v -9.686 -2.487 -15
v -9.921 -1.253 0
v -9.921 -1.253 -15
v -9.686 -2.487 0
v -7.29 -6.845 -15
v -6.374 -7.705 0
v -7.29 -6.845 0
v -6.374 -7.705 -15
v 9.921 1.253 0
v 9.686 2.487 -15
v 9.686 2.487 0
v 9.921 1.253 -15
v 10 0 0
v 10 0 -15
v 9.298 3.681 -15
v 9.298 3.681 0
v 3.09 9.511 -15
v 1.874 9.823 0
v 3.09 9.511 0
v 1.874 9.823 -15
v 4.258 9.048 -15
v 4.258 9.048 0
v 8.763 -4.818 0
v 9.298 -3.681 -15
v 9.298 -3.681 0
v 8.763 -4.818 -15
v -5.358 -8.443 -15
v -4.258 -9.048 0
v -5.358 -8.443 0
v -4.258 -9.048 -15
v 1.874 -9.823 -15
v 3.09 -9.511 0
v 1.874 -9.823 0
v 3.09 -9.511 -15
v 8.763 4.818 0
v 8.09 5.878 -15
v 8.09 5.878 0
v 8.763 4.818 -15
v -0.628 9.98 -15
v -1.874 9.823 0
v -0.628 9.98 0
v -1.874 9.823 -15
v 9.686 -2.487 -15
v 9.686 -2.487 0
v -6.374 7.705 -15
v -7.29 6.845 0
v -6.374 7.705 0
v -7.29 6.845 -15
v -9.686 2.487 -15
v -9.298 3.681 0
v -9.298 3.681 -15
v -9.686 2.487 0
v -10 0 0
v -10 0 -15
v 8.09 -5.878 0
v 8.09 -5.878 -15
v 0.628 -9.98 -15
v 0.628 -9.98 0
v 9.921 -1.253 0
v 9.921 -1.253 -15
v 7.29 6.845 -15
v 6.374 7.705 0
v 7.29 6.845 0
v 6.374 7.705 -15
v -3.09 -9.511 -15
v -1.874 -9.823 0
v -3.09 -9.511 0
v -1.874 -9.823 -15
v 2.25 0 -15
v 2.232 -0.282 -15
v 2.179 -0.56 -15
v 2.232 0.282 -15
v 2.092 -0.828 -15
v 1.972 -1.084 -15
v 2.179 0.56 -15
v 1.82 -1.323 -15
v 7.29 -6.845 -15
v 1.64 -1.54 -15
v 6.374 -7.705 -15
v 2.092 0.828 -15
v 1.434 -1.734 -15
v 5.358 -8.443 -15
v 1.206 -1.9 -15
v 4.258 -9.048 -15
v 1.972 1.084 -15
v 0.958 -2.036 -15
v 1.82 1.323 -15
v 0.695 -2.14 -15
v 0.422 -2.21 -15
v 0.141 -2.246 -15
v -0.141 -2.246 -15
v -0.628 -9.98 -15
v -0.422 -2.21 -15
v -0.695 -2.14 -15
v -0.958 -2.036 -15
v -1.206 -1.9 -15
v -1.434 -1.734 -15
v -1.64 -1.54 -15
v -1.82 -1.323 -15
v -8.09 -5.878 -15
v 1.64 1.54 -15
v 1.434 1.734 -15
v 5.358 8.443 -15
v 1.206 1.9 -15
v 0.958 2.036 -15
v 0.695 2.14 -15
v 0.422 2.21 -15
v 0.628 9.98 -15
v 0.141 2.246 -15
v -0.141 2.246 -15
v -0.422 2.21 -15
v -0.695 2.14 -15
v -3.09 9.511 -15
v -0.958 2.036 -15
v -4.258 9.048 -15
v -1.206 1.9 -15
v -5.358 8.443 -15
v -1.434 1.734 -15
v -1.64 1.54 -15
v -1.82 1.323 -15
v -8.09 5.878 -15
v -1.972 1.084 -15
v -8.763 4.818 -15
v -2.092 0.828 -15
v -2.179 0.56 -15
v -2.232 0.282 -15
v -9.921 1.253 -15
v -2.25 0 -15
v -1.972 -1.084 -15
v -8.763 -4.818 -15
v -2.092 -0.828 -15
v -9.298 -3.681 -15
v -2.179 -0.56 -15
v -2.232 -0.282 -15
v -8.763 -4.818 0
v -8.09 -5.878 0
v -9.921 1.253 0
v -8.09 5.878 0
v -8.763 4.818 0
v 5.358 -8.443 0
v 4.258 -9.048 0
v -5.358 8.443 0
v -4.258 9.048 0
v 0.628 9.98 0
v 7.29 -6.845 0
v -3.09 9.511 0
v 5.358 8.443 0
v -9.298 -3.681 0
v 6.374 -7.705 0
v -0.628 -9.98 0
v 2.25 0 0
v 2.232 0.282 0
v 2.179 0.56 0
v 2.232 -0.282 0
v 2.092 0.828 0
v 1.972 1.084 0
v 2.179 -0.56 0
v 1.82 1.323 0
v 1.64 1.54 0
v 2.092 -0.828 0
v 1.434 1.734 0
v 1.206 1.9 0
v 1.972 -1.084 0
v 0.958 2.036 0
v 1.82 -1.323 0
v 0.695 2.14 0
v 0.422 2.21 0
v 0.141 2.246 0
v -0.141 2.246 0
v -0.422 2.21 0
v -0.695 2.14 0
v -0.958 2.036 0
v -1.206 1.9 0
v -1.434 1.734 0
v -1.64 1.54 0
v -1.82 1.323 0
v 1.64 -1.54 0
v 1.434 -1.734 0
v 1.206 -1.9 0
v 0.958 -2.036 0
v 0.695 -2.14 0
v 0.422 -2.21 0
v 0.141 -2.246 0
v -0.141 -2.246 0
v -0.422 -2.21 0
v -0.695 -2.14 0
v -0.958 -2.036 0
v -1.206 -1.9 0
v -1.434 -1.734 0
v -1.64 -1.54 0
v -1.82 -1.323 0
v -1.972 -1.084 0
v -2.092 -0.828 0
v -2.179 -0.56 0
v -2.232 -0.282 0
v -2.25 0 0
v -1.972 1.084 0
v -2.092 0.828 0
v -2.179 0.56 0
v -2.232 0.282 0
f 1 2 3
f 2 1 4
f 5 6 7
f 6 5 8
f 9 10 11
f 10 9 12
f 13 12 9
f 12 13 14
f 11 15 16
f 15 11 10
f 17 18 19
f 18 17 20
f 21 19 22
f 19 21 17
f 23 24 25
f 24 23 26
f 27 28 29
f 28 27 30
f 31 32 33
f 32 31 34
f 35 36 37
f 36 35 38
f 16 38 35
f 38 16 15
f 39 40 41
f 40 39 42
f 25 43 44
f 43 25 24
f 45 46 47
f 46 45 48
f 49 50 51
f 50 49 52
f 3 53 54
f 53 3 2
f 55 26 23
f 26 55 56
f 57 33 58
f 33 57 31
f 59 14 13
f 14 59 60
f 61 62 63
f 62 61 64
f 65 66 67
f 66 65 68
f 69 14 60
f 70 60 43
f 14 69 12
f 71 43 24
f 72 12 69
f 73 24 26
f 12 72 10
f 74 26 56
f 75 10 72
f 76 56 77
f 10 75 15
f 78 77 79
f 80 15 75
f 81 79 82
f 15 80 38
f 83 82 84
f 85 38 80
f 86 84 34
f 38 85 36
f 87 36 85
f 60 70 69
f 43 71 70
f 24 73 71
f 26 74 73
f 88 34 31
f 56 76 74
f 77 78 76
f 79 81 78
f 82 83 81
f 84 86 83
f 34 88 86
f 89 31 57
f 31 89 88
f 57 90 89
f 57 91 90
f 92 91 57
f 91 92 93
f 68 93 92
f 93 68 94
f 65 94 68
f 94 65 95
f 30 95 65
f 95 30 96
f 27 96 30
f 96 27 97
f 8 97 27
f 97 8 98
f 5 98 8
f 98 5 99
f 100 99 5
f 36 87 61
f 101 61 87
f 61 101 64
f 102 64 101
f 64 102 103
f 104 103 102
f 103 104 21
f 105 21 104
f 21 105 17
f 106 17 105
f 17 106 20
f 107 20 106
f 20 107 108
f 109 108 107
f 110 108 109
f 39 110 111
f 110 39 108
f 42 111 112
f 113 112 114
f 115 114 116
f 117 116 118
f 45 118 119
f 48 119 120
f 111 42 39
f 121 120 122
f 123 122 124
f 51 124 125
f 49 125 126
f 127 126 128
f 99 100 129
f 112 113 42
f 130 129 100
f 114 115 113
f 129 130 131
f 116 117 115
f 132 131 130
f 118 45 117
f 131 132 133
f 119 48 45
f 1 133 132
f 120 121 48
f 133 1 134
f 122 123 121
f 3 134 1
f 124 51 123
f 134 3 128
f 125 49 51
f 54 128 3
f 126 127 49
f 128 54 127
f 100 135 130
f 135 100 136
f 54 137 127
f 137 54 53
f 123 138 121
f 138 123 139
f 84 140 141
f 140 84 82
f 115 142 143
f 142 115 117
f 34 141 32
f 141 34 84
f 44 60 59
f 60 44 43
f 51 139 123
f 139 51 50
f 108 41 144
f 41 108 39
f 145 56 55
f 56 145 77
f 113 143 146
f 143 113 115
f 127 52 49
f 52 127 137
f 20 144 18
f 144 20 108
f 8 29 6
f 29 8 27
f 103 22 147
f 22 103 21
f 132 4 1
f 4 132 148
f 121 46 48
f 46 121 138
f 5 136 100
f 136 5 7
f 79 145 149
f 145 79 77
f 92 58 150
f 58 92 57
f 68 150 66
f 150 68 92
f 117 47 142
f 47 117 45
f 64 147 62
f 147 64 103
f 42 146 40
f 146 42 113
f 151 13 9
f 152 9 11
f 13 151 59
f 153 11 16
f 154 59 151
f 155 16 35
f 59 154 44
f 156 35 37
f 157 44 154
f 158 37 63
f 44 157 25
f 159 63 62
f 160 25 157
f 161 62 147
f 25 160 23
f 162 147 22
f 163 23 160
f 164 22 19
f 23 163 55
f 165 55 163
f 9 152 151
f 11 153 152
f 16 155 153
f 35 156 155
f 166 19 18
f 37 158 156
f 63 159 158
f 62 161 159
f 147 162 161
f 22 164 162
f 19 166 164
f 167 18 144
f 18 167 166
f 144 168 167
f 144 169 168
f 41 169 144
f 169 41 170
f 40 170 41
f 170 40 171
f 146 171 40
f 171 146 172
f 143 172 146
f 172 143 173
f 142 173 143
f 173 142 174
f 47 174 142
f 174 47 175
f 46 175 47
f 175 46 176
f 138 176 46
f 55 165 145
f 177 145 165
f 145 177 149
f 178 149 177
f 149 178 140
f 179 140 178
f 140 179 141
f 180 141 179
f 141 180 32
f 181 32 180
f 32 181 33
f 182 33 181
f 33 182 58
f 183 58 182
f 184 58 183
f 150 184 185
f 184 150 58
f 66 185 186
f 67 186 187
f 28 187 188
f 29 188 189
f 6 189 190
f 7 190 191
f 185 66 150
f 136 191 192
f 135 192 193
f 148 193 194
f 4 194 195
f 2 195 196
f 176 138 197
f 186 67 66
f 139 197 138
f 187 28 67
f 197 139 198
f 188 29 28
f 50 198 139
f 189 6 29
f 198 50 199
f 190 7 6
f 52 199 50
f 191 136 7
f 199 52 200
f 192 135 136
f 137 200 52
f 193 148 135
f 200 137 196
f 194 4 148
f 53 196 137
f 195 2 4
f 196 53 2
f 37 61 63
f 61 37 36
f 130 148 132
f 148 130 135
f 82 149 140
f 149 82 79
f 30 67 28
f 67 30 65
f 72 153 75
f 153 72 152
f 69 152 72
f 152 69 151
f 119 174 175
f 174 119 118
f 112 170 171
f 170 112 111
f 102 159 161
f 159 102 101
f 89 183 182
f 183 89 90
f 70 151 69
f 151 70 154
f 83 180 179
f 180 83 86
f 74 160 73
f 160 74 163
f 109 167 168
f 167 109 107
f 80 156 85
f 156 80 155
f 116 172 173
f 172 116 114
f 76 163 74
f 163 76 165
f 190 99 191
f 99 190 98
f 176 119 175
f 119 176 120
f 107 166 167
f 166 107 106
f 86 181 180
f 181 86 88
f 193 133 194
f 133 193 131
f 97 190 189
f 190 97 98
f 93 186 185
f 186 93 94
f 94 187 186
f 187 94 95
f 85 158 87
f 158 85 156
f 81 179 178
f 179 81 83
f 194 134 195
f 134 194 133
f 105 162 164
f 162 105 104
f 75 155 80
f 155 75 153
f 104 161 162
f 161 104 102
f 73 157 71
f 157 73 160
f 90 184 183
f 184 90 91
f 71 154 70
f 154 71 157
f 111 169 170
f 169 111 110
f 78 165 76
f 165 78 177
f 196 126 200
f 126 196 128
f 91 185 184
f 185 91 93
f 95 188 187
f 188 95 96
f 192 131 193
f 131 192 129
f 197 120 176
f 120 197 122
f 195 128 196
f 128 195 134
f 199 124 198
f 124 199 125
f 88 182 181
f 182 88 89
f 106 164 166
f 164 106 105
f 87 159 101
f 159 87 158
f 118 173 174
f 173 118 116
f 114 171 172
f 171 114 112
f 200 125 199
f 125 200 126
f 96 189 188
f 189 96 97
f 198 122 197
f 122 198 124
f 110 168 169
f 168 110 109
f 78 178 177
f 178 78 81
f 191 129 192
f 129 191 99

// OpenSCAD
$fn = 50;


difference() {
	union() {
		translate(v = [0, 0, -15.0000000000]) {
			cylinder(h = 15, r = 10.0000000000);
		}
		cylinder(h = 0, r = 13.0000000000);
	}
	union() {
		#translate(v = [0, 0, -15]) {
			cylinder(h = 15, r = 2.2500000000);
		}
	}
}
